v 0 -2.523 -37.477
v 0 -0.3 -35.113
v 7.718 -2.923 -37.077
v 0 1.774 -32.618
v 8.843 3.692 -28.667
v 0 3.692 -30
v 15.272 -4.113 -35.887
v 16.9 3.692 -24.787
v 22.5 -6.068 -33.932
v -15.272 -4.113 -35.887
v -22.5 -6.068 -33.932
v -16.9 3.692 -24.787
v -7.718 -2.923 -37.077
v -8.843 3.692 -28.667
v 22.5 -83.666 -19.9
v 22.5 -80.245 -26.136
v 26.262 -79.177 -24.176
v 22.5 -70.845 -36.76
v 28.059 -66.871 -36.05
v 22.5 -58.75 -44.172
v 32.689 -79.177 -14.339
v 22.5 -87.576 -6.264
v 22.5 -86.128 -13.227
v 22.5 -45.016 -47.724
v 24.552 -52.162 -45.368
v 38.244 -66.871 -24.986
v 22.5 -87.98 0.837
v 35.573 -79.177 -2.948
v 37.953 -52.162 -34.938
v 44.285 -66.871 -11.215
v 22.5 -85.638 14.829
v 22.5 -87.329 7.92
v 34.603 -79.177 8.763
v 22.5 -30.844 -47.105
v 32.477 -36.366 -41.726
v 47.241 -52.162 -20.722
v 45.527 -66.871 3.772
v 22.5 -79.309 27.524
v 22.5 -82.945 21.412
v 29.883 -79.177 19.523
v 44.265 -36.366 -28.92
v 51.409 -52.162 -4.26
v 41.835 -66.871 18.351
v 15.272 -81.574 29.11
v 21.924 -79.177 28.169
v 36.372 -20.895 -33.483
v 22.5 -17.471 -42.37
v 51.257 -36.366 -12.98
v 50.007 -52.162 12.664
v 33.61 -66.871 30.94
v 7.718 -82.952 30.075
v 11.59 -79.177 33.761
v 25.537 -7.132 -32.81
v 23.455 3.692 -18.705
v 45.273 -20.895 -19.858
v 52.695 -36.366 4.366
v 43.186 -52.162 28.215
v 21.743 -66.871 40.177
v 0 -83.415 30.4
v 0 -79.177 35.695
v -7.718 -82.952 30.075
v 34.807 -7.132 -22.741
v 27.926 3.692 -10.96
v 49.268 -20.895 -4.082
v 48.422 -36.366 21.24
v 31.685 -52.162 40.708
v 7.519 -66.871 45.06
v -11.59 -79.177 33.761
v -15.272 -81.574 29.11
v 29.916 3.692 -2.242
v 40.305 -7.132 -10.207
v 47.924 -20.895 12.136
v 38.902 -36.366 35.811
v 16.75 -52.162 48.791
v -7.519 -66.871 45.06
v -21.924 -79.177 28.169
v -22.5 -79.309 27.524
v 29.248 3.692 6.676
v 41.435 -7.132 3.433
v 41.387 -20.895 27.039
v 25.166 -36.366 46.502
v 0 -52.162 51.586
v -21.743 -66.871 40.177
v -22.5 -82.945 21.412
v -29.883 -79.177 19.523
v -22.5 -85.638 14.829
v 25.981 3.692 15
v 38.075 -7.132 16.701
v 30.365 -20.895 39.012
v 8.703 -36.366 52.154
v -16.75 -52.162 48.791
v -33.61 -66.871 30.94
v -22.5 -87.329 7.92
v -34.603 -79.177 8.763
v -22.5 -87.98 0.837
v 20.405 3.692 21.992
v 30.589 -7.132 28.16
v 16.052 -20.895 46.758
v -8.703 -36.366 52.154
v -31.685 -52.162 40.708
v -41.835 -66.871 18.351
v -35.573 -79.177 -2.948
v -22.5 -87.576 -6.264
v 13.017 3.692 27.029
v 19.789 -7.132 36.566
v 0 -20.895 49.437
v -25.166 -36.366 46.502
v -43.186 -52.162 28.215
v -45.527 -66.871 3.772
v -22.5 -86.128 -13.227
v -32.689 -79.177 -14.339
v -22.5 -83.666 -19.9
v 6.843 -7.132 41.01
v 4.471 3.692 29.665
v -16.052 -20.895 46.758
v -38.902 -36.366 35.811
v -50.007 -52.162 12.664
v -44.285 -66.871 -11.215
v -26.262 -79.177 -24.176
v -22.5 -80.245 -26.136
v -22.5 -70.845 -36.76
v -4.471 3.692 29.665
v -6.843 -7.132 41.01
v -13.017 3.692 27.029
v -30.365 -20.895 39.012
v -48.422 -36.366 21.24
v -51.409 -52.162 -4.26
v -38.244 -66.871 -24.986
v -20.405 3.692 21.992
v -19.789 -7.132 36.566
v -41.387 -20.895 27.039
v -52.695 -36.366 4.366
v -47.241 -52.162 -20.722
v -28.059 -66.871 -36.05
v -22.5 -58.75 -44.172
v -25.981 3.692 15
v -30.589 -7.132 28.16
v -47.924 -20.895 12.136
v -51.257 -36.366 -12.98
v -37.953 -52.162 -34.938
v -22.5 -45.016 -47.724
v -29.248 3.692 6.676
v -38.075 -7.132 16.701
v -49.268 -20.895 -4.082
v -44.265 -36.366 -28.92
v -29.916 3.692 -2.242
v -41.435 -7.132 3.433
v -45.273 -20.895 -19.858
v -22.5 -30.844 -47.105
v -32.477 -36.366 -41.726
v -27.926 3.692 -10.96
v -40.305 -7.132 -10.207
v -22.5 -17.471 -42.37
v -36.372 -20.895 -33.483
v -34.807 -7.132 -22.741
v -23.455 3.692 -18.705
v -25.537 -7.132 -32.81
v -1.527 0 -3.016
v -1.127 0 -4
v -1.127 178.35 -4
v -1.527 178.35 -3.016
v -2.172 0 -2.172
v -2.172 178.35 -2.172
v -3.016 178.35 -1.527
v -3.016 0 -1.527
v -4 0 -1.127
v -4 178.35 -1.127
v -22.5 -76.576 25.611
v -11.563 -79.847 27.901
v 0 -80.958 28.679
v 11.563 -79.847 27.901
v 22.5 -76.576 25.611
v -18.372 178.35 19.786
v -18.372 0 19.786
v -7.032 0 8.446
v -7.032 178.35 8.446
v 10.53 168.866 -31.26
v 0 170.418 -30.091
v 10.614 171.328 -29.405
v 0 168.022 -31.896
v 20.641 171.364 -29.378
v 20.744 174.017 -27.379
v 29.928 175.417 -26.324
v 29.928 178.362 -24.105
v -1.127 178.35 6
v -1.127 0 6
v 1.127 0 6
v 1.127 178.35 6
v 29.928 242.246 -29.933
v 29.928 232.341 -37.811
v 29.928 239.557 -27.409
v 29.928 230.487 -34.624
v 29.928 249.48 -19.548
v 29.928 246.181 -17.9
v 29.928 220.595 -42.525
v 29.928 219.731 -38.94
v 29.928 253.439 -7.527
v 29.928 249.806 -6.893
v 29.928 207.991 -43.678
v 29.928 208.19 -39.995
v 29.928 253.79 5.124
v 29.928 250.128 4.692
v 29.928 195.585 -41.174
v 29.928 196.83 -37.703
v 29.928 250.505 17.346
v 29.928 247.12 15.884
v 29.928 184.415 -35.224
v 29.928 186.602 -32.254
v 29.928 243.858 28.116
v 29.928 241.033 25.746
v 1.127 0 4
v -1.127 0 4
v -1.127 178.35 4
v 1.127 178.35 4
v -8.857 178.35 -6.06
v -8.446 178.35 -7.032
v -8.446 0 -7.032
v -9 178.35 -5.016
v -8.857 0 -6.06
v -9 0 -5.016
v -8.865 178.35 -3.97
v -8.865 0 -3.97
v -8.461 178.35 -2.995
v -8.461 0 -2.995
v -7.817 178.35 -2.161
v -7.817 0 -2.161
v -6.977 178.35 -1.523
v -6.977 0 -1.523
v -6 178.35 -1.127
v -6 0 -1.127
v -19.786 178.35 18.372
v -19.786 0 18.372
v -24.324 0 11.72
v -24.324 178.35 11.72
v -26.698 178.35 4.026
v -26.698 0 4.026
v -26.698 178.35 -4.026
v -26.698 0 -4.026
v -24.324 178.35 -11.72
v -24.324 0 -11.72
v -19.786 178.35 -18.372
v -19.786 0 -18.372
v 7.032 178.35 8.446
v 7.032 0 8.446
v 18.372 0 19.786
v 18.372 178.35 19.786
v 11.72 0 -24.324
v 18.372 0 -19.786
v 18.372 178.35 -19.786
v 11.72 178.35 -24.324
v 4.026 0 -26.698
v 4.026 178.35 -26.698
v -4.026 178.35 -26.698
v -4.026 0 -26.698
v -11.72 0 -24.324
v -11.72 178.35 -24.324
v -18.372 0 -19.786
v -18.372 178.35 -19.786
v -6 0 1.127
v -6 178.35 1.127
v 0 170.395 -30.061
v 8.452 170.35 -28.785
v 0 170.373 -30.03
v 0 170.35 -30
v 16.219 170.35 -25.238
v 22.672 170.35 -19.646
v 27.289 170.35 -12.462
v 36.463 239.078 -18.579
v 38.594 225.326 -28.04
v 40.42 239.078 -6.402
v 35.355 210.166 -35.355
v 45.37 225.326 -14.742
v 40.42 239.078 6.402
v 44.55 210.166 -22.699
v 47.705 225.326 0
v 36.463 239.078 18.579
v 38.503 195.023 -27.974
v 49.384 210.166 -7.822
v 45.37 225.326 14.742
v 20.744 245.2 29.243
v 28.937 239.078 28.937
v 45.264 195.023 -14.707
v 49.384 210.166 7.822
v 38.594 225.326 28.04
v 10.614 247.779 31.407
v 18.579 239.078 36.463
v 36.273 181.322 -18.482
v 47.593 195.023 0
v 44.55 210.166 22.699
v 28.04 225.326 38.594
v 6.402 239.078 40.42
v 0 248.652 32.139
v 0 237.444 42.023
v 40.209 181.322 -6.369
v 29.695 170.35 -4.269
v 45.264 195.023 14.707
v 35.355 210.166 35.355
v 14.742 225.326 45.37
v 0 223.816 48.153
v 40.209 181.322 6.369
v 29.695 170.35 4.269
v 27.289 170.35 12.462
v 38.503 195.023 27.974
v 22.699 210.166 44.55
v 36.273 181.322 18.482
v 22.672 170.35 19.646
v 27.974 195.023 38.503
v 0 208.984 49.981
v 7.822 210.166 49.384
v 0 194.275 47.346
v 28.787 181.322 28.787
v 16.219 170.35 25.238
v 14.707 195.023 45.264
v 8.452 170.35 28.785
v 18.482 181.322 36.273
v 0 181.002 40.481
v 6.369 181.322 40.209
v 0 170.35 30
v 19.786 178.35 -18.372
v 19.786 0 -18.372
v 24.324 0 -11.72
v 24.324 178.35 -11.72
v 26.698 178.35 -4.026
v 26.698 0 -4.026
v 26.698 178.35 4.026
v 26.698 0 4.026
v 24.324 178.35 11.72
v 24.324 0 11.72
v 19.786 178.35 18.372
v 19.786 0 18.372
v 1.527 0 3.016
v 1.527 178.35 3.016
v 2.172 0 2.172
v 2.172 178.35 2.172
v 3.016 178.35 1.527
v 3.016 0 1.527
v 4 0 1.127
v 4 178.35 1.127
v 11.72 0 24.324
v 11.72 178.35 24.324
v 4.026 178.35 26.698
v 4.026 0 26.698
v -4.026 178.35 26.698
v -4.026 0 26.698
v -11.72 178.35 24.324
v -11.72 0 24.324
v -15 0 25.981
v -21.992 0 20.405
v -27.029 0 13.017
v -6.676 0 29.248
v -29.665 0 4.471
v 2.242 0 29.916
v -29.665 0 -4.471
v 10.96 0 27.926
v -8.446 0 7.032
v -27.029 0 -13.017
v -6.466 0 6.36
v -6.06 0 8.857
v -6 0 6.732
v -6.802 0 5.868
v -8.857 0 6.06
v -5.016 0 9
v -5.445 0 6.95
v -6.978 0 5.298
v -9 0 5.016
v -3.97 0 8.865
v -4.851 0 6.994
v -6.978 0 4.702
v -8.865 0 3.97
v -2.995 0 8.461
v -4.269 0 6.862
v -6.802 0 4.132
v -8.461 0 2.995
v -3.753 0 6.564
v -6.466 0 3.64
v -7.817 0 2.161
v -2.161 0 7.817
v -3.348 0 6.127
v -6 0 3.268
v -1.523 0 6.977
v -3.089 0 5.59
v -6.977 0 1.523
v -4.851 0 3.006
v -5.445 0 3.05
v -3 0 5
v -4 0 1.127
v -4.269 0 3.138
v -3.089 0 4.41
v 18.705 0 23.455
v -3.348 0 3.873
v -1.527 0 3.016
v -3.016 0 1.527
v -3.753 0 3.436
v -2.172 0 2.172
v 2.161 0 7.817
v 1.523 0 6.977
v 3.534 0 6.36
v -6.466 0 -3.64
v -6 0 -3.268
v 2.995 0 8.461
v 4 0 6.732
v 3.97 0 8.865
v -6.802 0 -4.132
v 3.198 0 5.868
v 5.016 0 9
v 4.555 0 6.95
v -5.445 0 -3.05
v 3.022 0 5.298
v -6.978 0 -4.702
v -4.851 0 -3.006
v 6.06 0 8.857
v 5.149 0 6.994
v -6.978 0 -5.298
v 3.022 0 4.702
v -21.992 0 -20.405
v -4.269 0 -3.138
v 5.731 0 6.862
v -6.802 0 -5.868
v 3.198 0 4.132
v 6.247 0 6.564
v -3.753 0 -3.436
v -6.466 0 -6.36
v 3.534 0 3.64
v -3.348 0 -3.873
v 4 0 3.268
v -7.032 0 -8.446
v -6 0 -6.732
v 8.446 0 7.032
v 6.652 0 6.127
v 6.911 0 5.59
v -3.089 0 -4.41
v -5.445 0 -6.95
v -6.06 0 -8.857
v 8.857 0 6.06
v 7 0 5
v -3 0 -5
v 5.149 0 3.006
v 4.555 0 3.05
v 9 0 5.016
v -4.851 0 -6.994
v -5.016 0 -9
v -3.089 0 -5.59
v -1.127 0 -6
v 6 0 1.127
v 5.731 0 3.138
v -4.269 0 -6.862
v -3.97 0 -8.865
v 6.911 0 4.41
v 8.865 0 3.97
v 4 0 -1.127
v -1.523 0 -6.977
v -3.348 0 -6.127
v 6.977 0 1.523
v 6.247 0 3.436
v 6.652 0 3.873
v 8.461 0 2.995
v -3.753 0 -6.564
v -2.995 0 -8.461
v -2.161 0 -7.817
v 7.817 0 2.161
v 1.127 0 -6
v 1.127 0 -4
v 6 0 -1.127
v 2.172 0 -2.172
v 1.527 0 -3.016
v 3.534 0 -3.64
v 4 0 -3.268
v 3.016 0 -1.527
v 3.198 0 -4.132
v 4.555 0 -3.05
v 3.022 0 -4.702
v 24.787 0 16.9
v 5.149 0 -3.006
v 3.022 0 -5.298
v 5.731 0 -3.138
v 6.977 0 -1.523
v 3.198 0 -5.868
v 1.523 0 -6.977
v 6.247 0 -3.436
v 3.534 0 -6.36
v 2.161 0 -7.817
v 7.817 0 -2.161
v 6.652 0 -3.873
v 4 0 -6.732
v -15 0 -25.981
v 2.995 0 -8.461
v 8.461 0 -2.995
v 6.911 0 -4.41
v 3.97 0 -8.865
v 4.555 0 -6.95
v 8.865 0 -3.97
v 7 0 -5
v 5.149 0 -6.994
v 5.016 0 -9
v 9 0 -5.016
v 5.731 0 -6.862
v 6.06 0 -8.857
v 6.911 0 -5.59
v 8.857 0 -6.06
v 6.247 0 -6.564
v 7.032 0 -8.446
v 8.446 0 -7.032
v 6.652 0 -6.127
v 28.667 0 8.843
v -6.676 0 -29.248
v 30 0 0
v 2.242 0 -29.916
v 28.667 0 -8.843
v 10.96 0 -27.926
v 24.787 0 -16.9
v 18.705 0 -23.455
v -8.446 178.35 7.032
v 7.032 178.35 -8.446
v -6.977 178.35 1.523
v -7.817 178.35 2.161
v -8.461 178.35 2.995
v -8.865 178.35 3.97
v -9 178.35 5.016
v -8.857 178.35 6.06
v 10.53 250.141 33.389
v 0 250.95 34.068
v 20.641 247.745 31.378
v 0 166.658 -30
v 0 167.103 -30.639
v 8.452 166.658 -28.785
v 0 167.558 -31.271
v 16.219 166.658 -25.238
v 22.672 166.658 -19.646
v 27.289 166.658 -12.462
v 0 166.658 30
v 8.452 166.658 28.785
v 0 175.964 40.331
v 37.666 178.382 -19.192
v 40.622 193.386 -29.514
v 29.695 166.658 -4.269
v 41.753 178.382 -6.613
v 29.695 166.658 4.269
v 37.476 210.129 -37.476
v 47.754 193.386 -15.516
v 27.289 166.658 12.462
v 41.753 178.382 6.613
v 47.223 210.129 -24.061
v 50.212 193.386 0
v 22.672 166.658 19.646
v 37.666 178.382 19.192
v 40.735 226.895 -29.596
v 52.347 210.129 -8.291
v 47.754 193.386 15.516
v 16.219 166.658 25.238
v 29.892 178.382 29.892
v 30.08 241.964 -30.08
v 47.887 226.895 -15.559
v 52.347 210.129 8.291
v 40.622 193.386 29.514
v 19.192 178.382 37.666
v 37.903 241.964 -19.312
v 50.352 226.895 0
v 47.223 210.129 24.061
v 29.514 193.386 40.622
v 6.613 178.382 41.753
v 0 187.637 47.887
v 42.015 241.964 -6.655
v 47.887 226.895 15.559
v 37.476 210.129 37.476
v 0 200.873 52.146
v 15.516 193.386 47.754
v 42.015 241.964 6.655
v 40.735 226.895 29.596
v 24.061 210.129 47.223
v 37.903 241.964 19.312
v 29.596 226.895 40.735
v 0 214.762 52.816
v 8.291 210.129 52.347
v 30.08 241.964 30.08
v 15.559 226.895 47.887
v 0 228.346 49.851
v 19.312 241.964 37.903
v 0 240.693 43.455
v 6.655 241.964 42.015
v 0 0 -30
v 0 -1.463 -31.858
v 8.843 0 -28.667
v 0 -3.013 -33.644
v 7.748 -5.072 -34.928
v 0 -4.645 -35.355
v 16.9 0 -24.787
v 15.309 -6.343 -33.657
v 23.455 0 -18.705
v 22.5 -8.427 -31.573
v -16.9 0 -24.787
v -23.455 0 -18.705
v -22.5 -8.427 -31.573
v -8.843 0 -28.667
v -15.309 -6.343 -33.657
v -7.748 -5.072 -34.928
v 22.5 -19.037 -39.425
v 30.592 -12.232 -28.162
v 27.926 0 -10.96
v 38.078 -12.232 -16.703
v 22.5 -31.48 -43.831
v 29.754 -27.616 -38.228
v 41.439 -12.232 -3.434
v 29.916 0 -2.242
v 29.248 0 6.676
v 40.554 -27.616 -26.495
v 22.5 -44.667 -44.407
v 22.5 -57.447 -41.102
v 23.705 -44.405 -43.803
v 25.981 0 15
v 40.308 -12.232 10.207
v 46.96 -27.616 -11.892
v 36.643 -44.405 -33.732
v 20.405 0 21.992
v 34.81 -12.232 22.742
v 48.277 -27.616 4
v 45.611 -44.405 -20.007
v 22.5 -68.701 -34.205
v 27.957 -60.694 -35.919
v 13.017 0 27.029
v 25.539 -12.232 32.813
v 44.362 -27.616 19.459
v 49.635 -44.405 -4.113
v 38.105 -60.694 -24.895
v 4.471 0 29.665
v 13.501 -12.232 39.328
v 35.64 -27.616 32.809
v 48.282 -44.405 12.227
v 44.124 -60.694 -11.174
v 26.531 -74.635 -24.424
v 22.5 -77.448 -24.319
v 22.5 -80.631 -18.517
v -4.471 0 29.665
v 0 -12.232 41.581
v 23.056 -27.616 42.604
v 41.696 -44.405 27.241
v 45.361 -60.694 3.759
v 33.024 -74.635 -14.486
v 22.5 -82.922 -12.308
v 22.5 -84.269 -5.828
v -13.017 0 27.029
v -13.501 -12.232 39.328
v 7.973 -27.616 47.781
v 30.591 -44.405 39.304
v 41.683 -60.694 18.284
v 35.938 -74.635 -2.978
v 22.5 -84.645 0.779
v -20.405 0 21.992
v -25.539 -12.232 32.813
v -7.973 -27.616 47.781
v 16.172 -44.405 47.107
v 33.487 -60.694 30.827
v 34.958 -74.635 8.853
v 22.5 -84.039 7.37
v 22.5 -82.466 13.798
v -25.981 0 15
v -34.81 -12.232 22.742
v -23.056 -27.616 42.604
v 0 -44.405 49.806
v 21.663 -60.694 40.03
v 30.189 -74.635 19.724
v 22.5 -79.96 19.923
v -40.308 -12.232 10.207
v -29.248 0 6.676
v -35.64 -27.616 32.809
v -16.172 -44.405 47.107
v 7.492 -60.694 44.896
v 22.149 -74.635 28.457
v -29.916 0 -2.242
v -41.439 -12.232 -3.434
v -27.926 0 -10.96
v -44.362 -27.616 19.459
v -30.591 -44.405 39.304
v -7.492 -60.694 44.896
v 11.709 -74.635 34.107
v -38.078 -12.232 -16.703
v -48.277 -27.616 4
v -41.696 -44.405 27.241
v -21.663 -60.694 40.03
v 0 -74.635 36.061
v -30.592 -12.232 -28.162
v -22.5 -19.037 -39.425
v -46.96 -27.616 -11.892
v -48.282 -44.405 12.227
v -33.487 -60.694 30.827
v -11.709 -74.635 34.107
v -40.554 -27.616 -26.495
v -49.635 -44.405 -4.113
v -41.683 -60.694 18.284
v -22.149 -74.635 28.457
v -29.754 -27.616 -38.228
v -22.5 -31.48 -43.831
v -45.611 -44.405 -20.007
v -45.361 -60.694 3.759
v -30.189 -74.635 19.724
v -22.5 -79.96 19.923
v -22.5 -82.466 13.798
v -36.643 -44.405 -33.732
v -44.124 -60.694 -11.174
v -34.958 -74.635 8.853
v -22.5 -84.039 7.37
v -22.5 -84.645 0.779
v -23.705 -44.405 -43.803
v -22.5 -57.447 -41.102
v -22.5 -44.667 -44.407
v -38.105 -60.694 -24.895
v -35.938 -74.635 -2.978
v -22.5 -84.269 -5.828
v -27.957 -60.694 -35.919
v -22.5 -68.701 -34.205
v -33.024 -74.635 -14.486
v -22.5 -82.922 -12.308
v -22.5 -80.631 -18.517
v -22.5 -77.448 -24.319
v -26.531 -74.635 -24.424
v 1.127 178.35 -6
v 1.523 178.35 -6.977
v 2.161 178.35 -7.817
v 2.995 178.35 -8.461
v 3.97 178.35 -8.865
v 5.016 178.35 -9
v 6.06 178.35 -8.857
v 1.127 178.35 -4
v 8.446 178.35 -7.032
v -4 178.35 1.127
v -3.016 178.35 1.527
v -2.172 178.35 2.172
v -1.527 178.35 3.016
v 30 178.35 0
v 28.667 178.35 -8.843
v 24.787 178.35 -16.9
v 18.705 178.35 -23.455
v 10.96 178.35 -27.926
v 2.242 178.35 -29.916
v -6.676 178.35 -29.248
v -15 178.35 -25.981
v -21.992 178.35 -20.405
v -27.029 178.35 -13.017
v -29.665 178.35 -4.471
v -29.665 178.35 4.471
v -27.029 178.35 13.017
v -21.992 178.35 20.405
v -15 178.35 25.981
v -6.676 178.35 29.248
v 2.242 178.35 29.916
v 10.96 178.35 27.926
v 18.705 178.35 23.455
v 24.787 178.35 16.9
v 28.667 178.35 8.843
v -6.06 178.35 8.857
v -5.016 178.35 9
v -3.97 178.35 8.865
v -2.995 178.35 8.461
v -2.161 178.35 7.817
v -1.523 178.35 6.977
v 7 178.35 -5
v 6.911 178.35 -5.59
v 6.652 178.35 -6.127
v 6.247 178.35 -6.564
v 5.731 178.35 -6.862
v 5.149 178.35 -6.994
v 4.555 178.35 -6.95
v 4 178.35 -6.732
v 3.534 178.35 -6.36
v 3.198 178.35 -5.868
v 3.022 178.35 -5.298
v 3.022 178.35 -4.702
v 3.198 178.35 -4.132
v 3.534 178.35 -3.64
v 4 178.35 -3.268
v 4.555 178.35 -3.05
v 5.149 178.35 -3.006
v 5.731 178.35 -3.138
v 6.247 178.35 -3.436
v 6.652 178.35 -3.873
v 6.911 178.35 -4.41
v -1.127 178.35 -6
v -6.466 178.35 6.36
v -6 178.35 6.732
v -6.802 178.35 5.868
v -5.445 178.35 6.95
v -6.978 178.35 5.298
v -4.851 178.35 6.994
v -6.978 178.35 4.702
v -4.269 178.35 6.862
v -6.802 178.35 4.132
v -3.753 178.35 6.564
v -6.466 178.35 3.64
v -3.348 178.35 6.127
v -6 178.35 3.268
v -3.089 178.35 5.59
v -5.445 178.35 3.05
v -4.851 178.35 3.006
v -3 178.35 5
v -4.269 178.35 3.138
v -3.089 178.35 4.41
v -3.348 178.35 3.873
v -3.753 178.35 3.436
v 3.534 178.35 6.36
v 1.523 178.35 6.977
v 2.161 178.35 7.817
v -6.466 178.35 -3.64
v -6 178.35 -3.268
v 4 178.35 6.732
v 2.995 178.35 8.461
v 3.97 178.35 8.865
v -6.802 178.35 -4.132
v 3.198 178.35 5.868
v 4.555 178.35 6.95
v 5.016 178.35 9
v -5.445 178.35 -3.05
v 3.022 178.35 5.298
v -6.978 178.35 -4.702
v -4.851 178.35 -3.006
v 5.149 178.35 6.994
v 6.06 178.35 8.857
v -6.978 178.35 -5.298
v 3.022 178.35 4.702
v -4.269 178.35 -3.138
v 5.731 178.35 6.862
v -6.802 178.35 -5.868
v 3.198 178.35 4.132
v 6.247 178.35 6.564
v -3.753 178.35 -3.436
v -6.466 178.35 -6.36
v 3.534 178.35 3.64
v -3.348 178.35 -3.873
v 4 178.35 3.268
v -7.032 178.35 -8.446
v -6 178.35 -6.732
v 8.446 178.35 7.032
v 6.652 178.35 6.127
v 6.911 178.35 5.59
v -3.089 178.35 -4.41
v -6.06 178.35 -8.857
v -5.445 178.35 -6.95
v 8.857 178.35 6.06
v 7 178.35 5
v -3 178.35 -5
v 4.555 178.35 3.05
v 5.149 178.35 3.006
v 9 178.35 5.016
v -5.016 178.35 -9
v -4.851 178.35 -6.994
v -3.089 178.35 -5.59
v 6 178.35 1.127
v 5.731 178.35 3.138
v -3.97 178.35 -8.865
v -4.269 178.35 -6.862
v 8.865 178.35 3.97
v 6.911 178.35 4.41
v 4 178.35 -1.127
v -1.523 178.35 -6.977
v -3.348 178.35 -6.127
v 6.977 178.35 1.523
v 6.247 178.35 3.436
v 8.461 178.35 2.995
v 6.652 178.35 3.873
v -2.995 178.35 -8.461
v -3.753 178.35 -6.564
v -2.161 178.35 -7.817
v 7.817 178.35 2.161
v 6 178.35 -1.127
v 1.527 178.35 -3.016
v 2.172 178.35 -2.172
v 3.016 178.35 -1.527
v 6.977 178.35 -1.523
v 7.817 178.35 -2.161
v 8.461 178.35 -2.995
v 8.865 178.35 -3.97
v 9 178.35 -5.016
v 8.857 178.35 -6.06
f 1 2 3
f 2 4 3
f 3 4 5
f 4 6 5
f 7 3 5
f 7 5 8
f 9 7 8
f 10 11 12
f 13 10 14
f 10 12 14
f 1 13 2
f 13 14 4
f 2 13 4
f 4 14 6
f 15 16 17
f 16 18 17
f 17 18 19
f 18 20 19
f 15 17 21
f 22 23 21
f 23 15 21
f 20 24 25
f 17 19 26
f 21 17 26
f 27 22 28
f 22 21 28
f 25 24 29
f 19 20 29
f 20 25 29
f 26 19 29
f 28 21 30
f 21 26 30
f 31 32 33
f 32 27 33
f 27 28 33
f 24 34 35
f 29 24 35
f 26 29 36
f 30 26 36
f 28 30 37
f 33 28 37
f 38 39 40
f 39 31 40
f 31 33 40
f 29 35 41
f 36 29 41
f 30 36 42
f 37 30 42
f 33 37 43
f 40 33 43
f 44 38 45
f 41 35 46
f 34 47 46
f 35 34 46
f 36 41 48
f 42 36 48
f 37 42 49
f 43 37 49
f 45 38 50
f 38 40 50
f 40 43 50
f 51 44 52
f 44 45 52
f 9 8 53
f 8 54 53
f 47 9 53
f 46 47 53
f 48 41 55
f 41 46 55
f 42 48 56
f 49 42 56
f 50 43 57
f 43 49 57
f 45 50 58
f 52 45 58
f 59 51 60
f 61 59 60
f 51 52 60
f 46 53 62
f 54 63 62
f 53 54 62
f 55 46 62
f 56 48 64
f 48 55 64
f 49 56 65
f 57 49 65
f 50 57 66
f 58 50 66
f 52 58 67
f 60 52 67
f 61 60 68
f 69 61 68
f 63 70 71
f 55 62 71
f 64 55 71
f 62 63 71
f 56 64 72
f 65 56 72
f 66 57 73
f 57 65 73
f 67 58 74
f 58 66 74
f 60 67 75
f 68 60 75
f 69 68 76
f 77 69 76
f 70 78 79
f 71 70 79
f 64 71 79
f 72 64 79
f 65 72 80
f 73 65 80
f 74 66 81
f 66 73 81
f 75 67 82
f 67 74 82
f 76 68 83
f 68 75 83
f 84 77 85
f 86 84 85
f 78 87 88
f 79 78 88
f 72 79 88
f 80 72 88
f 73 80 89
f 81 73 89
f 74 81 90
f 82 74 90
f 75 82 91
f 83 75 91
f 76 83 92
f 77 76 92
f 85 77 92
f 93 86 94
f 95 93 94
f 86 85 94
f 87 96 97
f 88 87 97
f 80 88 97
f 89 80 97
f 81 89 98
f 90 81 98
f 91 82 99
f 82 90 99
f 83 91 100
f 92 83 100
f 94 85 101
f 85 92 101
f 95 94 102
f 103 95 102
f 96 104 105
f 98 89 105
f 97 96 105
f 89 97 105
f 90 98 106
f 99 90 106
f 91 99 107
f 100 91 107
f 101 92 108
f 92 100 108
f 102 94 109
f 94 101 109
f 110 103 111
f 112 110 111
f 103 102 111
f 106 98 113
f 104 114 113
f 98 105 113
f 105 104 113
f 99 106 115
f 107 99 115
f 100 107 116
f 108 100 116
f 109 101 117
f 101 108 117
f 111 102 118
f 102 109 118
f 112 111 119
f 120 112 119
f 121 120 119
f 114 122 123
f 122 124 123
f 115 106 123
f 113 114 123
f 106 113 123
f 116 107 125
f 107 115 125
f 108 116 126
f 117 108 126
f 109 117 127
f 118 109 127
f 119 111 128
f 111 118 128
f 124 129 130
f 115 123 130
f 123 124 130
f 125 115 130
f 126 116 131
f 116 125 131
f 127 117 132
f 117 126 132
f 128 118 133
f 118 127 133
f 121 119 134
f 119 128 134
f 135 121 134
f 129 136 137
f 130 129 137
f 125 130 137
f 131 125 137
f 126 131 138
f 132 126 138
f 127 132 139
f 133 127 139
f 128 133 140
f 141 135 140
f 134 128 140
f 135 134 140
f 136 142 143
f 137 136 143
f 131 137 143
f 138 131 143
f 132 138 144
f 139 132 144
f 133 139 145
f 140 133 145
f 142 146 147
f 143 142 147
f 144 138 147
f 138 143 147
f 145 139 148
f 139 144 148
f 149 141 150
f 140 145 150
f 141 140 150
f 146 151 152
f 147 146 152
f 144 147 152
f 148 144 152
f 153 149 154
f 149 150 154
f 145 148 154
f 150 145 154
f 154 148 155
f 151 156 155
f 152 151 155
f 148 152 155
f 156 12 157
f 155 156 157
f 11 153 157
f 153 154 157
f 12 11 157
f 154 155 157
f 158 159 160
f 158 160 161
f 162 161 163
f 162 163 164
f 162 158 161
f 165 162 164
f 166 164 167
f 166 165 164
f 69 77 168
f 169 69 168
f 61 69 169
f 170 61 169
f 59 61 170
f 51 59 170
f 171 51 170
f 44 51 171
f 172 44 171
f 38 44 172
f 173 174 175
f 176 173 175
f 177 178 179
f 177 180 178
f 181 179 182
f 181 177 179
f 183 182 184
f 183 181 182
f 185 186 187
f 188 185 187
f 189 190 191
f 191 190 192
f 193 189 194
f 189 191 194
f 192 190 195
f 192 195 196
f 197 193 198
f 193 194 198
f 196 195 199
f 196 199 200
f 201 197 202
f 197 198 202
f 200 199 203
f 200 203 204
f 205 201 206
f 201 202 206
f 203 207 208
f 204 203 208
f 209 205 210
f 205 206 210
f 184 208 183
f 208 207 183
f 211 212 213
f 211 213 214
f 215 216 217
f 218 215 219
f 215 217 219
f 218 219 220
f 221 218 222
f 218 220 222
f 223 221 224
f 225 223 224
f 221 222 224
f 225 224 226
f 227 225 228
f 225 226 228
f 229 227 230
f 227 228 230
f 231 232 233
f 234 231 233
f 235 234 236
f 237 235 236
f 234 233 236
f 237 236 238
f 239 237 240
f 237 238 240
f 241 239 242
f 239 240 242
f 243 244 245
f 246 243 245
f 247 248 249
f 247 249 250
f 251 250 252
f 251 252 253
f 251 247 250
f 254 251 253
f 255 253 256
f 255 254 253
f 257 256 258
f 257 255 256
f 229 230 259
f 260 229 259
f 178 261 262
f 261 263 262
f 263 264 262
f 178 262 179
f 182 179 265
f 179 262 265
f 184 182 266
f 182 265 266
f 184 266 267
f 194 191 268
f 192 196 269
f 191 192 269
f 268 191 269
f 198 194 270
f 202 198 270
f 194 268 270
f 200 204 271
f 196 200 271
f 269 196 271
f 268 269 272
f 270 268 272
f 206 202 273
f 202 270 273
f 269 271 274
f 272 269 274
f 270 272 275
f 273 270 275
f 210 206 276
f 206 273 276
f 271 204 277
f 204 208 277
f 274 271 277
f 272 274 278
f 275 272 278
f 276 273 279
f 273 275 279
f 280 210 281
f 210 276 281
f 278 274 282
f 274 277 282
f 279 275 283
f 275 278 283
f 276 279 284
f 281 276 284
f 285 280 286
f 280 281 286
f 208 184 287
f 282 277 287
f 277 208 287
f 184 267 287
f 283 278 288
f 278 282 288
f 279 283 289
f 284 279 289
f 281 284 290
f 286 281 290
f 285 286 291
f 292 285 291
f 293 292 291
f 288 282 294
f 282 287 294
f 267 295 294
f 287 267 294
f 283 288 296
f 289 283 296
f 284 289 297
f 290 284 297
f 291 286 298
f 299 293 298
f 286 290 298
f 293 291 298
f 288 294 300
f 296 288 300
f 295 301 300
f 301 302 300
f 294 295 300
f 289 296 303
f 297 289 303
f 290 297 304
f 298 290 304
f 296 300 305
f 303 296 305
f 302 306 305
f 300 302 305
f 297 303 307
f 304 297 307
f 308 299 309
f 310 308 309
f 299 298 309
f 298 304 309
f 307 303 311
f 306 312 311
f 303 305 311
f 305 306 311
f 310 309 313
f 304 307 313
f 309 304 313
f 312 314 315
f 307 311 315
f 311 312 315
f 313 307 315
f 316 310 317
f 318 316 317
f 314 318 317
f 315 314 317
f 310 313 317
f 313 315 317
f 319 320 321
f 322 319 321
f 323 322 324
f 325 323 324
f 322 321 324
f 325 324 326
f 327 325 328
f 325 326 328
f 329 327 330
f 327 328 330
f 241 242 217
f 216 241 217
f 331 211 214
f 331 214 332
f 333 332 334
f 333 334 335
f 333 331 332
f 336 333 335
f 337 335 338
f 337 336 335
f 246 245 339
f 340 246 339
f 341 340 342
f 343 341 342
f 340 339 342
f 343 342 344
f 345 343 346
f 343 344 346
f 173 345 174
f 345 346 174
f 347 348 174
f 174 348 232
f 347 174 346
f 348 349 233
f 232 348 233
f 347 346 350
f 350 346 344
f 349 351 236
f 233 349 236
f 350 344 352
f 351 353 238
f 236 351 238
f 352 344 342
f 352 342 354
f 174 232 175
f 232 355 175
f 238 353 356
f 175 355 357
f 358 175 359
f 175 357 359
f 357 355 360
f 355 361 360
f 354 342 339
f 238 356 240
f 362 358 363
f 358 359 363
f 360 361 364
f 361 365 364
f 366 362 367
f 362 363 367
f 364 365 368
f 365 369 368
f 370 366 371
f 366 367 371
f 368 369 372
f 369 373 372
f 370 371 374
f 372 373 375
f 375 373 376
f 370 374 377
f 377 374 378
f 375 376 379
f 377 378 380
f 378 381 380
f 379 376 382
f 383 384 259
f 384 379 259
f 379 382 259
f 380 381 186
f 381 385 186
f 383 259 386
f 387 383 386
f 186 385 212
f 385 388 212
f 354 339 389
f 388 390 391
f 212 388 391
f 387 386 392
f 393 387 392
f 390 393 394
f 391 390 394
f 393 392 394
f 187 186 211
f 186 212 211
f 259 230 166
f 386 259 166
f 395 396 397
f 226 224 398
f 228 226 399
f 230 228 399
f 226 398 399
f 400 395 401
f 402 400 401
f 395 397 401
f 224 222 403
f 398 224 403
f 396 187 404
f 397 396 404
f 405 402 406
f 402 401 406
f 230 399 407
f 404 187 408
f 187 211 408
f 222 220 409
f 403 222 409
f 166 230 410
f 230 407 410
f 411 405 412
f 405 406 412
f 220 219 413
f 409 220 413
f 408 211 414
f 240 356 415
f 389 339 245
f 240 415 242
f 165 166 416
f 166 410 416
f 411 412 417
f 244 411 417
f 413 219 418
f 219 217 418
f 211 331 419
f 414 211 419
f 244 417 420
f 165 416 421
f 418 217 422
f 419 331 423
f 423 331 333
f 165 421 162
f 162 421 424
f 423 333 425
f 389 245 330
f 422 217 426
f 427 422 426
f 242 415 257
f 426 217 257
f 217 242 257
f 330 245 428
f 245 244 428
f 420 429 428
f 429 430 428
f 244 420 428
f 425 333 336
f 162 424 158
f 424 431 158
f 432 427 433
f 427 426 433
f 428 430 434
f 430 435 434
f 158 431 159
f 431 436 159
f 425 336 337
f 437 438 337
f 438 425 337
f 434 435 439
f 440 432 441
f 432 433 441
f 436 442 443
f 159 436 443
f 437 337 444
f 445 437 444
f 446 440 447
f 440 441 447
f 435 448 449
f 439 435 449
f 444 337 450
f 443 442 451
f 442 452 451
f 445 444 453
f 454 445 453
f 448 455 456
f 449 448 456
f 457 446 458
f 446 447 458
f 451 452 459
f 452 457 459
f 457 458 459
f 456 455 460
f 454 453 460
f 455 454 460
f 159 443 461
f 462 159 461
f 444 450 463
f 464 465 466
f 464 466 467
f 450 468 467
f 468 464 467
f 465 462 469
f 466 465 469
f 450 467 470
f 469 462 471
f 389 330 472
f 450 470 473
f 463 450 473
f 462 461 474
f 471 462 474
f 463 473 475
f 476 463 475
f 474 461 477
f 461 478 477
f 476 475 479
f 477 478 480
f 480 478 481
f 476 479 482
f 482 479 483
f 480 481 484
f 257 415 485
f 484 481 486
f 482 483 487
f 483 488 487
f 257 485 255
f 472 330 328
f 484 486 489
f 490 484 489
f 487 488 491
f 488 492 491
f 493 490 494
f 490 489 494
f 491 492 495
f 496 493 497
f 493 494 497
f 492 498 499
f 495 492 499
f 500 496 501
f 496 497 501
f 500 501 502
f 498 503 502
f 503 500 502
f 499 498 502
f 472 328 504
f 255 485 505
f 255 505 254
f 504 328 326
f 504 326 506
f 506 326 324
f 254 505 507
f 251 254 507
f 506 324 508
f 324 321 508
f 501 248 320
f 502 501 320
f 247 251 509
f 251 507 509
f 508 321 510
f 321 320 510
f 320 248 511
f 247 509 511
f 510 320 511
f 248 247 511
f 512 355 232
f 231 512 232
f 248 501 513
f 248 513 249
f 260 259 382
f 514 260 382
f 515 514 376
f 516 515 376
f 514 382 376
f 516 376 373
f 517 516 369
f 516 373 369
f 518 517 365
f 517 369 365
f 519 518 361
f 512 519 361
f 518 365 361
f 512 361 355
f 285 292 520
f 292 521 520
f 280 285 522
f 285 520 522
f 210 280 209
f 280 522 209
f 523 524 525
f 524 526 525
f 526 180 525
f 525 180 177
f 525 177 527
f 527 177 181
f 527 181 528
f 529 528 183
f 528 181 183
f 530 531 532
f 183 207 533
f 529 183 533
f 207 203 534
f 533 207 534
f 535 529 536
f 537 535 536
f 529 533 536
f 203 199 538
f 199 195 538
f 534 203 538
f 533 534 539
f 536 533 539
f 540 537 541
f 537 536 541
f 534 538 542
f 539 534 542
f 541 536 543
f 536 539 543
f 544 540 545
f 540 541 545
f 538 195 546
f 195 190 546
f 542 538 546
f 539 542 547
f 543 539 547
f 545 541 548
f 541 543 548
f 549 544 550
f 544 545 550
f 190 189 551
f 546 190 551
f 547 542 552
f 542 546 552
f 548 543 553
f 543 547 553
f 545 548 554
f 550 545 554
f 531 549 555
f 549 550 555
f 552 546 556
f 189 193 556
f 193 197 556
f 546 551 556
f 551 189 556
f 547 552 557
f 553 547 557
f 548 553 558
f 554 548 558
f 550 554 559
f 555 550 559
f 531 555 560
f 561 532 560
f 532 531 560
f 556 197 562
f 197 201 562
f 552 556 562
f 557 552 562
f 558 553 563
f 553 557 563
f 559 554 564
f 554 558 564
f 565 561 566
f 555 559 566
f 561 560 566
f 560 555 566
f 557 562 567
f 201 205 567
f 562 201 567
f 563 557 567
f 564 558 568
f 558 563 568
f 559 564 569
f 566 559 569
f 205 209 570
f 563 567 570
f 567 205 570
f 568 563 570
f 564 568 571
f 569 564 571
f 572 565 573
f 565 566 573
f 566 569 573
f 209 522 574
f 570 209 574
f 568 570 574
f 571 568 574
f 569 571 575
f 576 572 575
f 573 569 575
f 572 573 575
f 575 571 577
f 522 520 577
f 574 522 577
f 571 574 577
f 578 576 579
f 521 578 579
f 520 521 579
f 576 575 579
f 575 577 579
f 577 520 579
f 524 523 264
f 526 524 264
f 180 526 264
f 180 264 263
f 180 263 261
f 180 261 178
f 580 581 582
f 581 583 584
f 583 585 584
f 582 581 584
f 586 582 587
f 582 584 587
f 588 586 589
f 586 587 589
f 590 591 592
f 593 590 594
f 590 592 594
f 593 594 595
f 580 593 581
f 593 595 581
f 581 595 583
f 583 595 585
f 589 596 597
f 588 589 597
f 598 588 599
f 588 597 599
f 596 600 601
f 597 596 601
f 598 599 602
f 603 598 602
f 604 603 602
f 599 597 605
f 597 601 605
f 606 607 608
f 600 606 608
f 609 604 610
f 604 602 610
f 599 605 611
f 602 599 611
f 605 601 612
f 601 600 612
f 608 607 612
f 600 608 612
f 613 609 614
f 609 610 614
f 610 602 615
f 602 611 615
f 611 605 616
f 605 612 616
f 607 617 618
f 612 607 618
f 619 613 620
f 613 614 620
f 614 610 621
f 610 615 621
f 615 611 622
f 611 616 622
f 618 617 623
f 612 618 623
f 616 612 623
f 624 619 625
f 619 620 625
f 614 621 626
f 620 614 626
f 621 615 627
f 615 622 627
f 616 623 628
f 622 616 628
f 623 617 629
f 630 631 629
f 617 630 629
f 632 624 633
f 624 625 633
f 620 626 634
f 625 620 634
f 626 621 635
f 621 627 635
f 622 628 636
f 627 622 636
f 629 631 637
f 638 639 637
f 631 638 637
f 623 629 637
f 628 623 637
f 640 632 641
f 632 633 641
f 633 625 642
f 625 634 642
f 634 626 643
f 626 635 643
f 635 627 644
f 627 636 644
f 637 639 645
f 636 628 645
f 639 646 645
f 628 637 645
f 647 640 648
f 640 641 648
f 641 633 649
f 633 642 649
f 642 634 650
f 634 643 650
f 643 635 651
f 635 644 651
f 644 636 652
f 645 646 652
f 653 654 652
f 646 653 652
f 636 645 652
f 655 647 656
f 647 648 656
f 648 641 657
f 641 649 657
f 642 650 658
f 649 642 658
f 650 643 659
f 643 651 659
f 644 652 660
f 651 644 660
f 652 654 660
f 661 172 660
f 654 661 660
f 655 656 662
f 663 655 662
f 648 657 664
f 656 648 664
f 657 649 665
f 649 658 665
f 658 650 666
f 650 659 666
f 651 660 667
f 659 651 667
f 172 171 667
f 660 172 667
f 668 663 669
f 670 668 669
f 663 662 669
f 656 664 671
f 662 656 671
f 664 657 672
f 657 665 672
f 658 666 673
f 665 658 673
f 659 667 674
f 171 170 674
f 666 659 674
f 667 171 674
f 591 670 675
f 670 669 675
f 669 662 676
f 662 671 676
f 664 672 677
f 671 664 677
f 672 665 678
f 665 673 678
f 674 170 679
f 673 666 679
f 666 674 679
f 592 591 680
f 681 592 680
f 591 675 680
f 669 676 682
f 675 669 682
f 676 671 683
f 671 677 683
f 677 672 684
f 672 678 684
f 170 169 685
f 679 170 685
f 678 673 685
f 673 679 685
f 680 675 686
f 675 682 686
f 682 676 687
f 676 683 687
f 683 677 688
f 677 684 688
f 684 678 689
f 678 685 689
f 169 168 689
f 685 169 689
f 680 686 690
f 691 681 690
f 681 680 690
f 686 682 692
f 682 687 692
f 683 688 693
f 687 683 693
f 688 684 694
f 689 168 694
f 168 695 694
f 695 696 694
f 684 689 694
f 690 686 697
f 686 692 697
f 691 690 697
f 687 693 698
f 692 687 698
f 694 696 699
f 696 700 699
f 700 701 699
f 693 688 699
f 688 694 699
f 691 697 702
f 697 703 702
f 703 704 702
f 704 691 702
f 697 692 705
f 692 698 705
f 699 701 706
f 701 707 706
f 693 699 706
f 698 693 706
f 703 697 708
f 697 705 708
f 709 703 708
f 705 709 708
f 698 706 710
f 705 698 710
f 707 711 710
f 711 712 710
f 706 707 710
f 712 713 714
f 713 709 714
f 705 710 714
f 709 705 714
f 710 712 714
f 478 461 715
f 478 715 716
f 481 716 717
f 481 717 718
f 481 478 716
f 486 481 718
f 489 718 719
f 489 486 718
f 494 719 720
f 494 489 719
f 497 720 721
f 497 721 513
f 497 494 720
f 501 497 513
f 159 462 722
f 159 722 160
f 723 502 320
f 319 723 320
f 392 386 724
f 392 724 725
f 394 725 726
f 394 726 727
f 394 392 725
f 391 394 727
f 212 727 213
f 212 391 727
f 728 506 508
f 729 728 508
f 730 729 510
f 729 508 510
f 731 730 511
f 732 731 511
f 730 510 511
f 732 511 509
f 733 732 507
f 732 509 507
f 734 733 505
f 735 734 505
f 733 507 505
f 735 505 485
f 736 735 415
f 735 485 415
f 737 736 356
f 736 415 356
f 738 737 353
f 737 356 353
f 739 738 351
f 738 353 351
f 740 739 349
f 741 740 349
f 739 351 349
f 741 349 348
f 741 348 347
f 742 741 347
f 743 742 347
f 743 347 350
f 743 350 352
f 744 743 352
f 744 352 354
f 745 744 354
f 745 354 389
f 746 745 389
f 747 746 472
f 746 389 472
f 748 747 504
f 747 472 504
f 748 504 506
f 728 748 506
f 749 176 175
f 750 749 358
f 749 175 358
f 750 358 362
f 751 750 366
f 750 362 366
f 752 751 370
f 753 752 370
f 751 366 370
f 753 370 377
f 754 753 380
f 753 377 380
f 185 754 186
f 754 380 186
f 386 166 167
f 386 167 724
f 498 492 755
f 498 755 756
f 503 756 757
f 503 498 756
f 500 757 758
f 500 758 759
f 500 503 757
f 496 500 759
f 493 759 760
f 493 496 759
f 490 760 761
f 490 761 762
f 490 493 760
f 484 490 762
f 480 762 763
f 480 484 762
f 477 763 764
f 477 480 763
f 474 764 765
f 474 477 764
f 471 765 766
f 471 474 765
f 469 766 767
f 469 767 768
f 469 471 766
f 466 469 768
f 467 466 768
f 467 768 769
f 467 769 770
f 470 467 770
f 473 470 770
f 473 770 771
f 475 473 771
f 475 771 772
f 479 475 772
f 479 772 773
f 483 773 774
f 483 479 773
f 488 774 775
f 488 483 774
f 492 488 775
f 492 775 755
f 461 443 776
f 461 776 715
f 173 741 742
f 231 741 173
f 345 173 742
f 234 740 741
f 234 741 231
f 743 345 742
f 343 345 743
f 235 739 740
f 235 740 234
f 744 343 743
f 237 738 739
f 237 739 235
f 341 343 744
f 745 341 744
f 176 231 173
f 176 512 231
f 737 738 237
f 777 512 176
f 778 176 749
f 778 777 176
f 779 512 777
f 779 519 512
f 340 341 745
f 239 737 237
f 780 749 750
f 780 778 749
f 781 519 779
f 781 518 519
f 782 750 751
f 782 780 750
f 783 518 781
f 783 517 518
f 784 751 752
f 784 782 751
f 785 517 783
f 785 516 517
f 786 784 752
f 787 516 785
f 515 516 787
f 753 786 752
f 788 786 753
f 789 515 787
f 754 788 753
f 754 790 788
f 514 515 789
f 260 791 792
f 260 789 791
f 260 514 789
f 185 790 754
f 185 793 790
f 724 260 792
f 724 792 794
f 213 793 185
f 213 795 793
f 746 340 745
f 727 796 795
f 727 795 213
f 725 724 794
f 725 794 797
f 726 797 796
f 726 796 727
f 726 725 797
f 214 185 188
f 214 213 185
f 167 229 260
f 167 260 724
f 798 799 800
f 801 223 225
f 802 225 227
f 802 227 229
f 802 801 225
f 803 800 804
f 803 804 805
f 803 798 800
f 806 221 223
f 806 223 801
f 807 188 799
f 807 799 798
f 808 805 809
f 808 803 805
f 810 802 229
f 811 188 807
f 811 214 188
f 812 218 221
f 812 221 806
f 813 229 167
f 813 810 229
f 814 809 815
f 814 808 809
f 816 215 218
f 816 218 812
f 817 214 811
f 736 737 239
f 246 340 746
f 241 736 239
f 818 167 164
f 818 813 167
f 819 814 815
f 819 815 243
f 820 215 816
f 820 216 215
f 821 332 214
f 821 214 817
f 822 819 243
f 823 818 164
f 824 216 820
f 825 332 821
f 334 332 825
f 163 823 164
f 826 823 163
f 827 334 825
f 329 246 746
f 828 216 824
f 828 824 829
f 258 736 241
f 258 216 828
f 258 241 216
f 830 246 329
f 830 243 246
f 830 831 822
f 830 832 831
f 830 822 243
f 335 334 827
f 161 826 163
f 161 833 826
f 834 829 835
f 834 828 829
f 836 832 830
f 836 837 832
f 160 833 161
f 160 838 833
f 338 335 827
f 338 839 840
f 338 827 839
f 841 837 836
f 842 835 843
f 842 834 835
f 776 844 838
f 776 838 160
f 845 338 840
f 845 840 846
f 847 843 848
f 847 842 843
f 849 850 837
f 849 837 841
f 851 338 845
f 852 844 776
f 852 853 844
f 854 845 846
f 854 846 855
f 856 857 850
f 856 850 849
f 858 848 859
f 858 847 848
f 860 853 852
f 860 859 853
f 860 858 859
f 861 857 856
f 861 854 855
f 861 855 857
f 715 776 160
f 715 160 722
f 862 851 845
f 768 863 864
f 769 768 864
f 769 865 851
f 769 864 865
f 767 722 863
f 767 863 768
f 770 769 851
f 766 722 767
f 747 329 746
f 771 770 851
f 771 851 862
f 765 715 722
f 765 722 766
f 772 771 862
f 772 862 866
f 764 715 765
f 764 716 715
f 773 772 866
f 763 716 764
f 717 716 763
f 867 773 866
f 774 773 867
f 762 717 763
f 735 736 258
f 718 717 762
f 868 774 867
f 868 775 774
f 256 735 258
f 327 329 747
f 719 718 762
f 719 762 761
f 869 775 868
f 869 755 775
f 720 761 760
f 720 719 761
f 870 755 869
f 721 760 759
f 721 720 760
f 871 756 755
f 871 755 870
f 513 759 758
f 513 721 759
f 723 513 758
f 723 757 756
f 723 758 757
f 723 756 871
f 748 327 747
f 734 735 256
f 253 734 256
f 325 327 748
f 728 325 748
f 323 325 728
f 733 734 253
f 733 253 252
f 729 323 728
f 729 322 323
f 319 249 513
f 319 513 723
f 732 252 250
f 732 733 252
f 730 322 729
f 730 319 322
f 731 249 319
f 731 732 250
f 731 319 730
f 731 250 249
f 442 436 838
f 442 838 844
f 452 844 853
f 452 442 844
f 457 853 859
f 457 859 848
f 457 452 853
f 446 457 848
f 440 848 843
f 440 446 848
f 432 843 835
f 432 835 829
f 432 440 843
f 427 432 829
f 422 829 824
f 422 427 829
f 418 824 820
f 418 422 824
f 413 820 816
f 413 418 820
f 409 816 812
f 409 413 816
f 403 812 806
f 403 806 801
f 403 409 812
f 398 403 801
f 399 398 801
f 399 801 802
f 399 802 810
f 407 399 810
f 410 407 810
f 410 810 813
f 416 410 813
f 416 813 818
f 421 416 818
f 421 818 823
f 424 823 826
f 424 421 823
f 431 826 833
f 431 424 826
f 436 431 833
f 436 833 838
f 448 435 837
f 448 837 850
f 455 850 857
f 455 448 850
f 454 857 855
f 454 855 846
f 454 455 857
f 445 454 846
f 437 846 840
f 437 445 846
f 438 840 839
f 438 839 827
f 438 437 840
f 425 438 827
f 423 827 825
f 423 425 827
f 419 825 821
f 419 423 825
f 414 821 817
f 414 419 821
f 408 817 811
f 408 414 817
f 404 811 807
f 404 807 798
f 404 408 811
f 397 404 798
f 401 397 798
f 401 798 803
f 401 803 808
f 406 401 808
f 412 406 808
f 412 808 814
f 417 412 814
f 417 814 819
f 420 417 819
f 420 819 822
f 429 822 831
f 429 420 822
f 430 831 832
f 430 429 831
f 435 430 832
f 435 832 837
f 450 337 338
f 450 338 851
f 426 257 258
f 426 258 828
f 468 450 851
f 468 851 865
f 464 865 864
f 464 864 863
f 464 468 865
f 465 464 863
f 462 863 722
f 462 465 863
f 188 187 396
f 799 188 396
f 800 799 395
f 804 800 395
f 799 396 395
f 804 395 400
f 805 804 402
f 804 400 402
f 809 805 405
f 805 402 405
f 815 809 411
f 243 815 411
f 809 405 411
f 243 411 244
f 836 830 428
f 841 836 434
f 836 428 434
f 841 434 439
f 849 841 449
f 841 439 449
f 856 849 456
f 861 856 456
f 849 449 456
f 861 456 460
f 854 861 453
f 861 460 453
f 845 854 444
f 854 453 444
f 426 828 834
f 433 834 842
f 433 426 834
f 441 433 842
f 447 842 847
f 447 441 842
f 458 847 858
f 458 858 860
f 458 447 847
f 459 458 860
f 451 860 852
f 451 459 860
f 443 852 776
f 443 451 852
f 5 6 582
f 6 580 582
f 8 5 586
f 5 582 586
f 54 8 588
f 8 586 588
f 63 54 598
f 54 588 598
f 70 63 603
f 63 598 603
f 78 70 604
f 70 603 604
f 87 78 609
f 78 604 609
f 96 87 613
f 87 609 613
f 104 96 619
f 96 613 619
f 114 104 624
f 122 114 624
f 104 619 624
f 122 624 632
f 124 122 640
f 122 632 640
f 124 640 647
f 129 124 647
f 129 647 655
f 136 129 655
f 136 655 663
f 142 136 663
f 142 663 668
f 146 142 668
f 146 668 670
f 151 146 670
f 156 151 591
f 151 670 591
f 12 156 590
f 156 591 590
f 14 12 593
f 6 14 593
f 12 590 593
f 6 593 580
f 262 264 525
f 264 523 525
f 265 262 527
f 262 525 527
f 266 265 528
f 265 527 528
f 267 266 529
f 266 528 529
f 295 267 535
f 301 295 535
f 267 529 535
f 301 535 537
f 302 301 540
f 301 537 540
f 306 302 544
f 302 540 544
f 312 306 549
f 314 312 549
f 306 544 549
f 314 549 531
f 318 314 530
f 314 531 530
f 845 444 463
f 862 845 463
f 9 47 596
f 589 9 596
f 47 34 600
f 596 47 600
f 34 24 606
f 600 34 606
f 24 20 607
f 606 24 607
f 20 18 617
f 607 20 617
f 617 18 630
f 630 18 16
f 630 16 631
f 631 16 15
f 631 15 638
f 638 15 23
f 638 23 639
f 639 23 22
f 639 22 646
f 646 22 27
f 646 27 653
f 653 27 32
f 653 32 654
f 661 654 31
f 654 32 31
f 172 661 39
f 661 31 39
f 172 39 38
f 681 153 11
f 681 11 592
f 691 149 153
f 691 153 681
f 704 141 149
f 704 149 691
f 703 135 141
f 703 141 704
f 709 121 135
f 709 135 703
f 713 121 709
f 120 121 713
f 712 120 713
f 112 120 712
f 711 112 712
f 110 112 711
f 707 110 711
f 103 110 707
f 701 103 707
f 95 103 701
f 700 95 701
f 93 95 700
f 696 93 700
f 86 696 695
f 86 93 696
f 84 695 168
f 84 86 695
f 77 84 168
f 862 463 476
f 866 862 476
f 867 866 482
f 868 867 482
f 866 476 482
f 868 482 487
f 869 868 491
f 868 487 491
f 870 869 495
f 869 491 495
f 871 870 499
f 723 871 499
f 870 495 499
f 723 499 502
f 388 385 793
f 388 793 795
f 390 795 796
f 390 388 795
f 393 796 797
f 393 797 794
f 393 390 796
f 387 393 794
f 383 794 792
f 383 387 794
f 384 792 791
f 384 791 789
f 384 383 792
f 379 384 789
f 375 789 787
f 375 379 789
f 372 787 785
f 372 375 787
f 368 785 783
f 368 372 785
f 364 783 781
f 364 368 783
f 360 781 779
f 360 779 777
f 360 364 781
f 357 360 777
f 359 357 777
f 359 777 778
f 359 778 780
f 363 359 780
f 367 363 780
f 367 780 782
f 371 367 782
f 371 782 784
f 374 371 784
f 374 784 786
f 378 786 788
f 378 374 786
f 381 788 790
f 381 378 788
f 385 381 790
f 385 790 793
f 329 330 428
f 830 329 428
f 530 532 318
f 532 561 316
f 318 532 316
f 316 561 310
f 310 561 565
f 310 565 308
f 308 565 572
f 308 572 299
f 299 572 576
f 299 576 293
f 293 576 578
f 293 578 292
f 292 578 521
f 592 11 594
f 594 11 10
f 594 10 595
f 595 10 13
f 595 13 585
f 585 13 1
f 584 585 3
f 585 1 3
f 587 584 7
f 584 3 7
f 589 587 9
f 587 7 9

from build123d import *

# Parameters (mm, degrees)
SKETCH_7_R                = 30
SKETCH_7_R_2              = 2
EXTRUDE_1_DEPTH           = 178.35
REVOLVE_1_ANGLE           = 180
SKETCH_13_W               = 62
SKETCH_13_H               = 63.428923534
REVOLVE_2_ANGLE           = 130
REVOLVE_2_OTHER_WAY_ANGLE = 53
SKETCH_19_W               = 45
SKETCH_19_H               = 76.537430518
REVOLVE_4_ANGLE           = 45
REVOLVE_4_OTHER_WAY_ANGLE = 125


with BuildPart() as part:
    # 草图7 → 凸台-拉伸1 (new body)
    with BuildSketch(Plane(origin=(0, 0, 0), x_dir=(1, 0, 0), z_dir=(0, 1, 0))):
        Circle(SKETCH_7_R)
        with Locations((5, 5)):
            Circle(SKETCH_7_R_2, mode=Mode.SUBTRACT)
        with Locations((5, -5)):
            Circle(SKETCH_7_R_2, mode=Mode.SUBTRACT)
        with Locations((-5, -5)):
            Circle(SKETCH_7_R_2, mode=Mode.SUBTRACT)
        with Locations((-5, 5)):
            Circle(SKETCH_7_R_2, mode=Mode.SUBTRACT)
        with BuildLine():
            Line((7.031506006, 8.445719569), (18.371677247, 19.78589081))
            ThreePointArc((18.371677247, 19.78589081), (0, 27), (-18.371677247, 19.78589081))
            Line((-18.371677247, 19.78589081), (-7.031506006, 8.445719569))
            ThreePointArc((-7.031506006, 8.445719569), (-3.469266271, 8.69551813), (-1.127016654, 6))
            Line((-1.127016654, 6), (1.127016654, 6))
            ThreePointArc((1.127016654, 6), (3.469266271, 8.69551813), (7.031506006, 8.445719569))
        make_face(mode=Mode.SUBTRACT)
        with BuildLine():
            Line((8.445719569, 7.031506006), (19.78589081, 18.371677247))
            ThreePointArc((19.78589081, 18.371677247), (27, 0), (19.78589081, -18.371677247))
            Line((19.78589081, -18.371677247), (8.445719569, -7.031506006))
            ThreePointArc((8.445719569, -7.031506006), (8.69551813, -3.469266271), (6, -1.127016654))
            Line((6, -1.127016654), (6, 1.127016654))
            ThreePointArc((6, 1.127016654), (8.69551813, 3.469266271), (8.445719569, 7.031506006))
        make_face(mode=Mode.SUBTRACT)
        with BuildLine():
            Line((7.031506006, -8.445719569), (18.371677247, -19.78589081))
            ThreePointArc((18.371677247, -19.78589081), (0, -27), (-18.371677247, -19.78589081))
            Line((-18.371677247, -19.78589081), (-7.031506006, -8.445719569))
            ThreePointArc((-7.031506006, -8.445719569), (-3.469266271, -8.69551813), (-1.127016654, -6))
            Line((-1.127016654, -6), (1.127016654, -6))
            ThreePointArc((1.127016654, -6), (3.469266271, -8.69551813), (7.031506006, -8.445719569))
        make_face(mode=Mode.SUBTRACT)
        with BuildLine():
            Line((-8.445719569, -7.031506006), (-19.78589081, -18.371677247))
            ThreePointArc((-19.78589081, -18.371677247), (-27, 0), (-19.78589081, 18.371677247))
            Line((-19.78589081, 18.371677247), (-8.445719569, 7.031506006))
            ThreePointArc((-8.445719569, 7.031506006), (-8.69551813, 3.469266271), (-6, 1.127016654))
            Line((-6, 1.127016654), (-6, -1.127016654))
            ThreePointArc((-6, -1.127016654), (-8.69551813, -3.469266271), (-8.445719569, -7.031506006))
        make_face(mode=Mode.SUBTRACT)
        with BuildLine():
            Line((1.127016654, 4), (-1.127016654, 4))
            ThreePointArc((-1.127016654, 4), (-2.171572875, 2.171572875), (-4, 1.127016654))
            Line((-4, 1.127016654), (-4, -1.127016654))
            ThreePointArc((-4, -1.127016654), (-2.171572875, -2.171572875), (-1.127016654, -4))
            Line((-1.127016654, -4), (1.127016654, -4))
            ThreePointArc((1.127016654, -4), (2.171572875, -2.171572875), (4, -1.127016654))
            Line((4, -1.127016654), (4, 1.127016654))
            ThreePointArc((4, 1.127016654), (2.171572875, 2.171572875), (1.127016654, 4))
        make_face(mode=Mode.SUBTRACT)
    extrude(amount=EXTRUDE_1_DEPTH)


with BuildPart() as body_2:
    # 草图8 → 旋转1 (revolve)
    with BuildSketch(Plane(origin=(0, 0, 0), x_dir=(0, 0, -1), z_dir=(1, 0, 0))):
        with BuildLine():
            Line((0, 263.35), (0, 260.35))
            ThreePointArc((0, 260.35), (47.434164903, 226.161388301), (30, 170.35))
            Line((30, 170.35), (30, 166.65789545))
            ThreePointArc((30, 166.65789545), (50.619569048, 226.055388547), (0, 263.35))
        make_face()
    revolve(axis=Axis((0, 210.35, 0), (0, -1, 0)), revolution_arc=REVOLVE_1_ANGLE)


with BuildPart() as body_3:
    # 草图13 → 旋转2 (revolve)
    with BuildSketch(Plane(origin=(0, 210.35, 0), x_dir=(1, 0, 0), z_dir=(0, 1, 0))):
        with Locations((-1.07172831, 63.714461767)):
            Rectangle(SKETCH_13_W, SKETCH_13_H)
    revolve(axis=Axis((-30.13148335, 210.35, 0), (1, 0, 0)), revolution_arc=REVOLVE_2_ANGLE)

    # 草图13 → 旋转2 other way (revolve)
    with BuildSketch(Plane(origin=(0, 210.35, 0), x_dir=(1, 0, 0), z_dir=(0, 1, 0))):
        with Locations((-1.07172831, 63.714461767)):
            Rectangle(SKETCH_13_W, SKETCH_13_H)
    revolve(axis=Axis((-30.13148335, 210.35, 0), (-1, 0, 0)), revolution_arc=REVOLVE_2_OTHER_WAY_ANGLE)


with BuildPart() as body_2_1:
    add(body_2.part)

    # Combine 1: cut body 3
    add(body_3.part, mode=Mode.SUBTRACT)


with BuildPart() as body_3_2:
    # 草图17 → 旋转3 (revolve)
    with BuildSketch(Plane(origin=(0, 0, 0), x_dir=(0, 0, -1), z_dir=(1, 0, 0))):
        with BuildLine():
            Line((0, -90), (0, -93))
            ThreePointArc((0, -93), (50.619569048, -55.705388547), (30, 3.69210455))
            Line((30, 3.69210455), (30, 0))
            ThreePointArc((30, 0), (47.434164903, -55.811388301), (0, -90))
        make_face()
    revolve(axis=Axis((0, 0, 0), (0, -1, 0)))


with BuildPart() as body_4:
    # 草图19 → 旋转4 (revolve)
    with BuildSketch(Plane(origin=(0, -40, 0), x_dir=(1, 0, 0), z_dir=(0, 1, 0))):
        with Locations((0, 38.268715259)):
            Rectangle(SKETCH_19_W, SKETCH_19_H)
    revolve(axis=Axis((-67.878952915, -40, 0), (1, 0, 0)), revolution_arc=REVOLVE_4_ANGLE)

    # 草图19 → 旋转4 other way (revolve)
    with BuildSketch(Plane(origin=(0, -40, 0), x_dir=(1, 0, 0), z_dir=(0, 1, 0))):
        with Locations((0, 38.268715259)):
            Rectangle(SKETCH_19_W, SKETCH_19_H)
    revolve(axis=Axis((-67.878952915, -40, 0), (-1, 0, 0)), revolution_arc=REVOLVE_4_OTHER_WAY_ANGLE)


with BuildPart() as body_3_2_1:
    add(body_3_2.part)

    # Combine 2: cut body 4
    add(body_4.part, mode=Mode.SUBTRACT)


solid = Compound([part.part, body_2_1.part, body_3_2_1.part])
